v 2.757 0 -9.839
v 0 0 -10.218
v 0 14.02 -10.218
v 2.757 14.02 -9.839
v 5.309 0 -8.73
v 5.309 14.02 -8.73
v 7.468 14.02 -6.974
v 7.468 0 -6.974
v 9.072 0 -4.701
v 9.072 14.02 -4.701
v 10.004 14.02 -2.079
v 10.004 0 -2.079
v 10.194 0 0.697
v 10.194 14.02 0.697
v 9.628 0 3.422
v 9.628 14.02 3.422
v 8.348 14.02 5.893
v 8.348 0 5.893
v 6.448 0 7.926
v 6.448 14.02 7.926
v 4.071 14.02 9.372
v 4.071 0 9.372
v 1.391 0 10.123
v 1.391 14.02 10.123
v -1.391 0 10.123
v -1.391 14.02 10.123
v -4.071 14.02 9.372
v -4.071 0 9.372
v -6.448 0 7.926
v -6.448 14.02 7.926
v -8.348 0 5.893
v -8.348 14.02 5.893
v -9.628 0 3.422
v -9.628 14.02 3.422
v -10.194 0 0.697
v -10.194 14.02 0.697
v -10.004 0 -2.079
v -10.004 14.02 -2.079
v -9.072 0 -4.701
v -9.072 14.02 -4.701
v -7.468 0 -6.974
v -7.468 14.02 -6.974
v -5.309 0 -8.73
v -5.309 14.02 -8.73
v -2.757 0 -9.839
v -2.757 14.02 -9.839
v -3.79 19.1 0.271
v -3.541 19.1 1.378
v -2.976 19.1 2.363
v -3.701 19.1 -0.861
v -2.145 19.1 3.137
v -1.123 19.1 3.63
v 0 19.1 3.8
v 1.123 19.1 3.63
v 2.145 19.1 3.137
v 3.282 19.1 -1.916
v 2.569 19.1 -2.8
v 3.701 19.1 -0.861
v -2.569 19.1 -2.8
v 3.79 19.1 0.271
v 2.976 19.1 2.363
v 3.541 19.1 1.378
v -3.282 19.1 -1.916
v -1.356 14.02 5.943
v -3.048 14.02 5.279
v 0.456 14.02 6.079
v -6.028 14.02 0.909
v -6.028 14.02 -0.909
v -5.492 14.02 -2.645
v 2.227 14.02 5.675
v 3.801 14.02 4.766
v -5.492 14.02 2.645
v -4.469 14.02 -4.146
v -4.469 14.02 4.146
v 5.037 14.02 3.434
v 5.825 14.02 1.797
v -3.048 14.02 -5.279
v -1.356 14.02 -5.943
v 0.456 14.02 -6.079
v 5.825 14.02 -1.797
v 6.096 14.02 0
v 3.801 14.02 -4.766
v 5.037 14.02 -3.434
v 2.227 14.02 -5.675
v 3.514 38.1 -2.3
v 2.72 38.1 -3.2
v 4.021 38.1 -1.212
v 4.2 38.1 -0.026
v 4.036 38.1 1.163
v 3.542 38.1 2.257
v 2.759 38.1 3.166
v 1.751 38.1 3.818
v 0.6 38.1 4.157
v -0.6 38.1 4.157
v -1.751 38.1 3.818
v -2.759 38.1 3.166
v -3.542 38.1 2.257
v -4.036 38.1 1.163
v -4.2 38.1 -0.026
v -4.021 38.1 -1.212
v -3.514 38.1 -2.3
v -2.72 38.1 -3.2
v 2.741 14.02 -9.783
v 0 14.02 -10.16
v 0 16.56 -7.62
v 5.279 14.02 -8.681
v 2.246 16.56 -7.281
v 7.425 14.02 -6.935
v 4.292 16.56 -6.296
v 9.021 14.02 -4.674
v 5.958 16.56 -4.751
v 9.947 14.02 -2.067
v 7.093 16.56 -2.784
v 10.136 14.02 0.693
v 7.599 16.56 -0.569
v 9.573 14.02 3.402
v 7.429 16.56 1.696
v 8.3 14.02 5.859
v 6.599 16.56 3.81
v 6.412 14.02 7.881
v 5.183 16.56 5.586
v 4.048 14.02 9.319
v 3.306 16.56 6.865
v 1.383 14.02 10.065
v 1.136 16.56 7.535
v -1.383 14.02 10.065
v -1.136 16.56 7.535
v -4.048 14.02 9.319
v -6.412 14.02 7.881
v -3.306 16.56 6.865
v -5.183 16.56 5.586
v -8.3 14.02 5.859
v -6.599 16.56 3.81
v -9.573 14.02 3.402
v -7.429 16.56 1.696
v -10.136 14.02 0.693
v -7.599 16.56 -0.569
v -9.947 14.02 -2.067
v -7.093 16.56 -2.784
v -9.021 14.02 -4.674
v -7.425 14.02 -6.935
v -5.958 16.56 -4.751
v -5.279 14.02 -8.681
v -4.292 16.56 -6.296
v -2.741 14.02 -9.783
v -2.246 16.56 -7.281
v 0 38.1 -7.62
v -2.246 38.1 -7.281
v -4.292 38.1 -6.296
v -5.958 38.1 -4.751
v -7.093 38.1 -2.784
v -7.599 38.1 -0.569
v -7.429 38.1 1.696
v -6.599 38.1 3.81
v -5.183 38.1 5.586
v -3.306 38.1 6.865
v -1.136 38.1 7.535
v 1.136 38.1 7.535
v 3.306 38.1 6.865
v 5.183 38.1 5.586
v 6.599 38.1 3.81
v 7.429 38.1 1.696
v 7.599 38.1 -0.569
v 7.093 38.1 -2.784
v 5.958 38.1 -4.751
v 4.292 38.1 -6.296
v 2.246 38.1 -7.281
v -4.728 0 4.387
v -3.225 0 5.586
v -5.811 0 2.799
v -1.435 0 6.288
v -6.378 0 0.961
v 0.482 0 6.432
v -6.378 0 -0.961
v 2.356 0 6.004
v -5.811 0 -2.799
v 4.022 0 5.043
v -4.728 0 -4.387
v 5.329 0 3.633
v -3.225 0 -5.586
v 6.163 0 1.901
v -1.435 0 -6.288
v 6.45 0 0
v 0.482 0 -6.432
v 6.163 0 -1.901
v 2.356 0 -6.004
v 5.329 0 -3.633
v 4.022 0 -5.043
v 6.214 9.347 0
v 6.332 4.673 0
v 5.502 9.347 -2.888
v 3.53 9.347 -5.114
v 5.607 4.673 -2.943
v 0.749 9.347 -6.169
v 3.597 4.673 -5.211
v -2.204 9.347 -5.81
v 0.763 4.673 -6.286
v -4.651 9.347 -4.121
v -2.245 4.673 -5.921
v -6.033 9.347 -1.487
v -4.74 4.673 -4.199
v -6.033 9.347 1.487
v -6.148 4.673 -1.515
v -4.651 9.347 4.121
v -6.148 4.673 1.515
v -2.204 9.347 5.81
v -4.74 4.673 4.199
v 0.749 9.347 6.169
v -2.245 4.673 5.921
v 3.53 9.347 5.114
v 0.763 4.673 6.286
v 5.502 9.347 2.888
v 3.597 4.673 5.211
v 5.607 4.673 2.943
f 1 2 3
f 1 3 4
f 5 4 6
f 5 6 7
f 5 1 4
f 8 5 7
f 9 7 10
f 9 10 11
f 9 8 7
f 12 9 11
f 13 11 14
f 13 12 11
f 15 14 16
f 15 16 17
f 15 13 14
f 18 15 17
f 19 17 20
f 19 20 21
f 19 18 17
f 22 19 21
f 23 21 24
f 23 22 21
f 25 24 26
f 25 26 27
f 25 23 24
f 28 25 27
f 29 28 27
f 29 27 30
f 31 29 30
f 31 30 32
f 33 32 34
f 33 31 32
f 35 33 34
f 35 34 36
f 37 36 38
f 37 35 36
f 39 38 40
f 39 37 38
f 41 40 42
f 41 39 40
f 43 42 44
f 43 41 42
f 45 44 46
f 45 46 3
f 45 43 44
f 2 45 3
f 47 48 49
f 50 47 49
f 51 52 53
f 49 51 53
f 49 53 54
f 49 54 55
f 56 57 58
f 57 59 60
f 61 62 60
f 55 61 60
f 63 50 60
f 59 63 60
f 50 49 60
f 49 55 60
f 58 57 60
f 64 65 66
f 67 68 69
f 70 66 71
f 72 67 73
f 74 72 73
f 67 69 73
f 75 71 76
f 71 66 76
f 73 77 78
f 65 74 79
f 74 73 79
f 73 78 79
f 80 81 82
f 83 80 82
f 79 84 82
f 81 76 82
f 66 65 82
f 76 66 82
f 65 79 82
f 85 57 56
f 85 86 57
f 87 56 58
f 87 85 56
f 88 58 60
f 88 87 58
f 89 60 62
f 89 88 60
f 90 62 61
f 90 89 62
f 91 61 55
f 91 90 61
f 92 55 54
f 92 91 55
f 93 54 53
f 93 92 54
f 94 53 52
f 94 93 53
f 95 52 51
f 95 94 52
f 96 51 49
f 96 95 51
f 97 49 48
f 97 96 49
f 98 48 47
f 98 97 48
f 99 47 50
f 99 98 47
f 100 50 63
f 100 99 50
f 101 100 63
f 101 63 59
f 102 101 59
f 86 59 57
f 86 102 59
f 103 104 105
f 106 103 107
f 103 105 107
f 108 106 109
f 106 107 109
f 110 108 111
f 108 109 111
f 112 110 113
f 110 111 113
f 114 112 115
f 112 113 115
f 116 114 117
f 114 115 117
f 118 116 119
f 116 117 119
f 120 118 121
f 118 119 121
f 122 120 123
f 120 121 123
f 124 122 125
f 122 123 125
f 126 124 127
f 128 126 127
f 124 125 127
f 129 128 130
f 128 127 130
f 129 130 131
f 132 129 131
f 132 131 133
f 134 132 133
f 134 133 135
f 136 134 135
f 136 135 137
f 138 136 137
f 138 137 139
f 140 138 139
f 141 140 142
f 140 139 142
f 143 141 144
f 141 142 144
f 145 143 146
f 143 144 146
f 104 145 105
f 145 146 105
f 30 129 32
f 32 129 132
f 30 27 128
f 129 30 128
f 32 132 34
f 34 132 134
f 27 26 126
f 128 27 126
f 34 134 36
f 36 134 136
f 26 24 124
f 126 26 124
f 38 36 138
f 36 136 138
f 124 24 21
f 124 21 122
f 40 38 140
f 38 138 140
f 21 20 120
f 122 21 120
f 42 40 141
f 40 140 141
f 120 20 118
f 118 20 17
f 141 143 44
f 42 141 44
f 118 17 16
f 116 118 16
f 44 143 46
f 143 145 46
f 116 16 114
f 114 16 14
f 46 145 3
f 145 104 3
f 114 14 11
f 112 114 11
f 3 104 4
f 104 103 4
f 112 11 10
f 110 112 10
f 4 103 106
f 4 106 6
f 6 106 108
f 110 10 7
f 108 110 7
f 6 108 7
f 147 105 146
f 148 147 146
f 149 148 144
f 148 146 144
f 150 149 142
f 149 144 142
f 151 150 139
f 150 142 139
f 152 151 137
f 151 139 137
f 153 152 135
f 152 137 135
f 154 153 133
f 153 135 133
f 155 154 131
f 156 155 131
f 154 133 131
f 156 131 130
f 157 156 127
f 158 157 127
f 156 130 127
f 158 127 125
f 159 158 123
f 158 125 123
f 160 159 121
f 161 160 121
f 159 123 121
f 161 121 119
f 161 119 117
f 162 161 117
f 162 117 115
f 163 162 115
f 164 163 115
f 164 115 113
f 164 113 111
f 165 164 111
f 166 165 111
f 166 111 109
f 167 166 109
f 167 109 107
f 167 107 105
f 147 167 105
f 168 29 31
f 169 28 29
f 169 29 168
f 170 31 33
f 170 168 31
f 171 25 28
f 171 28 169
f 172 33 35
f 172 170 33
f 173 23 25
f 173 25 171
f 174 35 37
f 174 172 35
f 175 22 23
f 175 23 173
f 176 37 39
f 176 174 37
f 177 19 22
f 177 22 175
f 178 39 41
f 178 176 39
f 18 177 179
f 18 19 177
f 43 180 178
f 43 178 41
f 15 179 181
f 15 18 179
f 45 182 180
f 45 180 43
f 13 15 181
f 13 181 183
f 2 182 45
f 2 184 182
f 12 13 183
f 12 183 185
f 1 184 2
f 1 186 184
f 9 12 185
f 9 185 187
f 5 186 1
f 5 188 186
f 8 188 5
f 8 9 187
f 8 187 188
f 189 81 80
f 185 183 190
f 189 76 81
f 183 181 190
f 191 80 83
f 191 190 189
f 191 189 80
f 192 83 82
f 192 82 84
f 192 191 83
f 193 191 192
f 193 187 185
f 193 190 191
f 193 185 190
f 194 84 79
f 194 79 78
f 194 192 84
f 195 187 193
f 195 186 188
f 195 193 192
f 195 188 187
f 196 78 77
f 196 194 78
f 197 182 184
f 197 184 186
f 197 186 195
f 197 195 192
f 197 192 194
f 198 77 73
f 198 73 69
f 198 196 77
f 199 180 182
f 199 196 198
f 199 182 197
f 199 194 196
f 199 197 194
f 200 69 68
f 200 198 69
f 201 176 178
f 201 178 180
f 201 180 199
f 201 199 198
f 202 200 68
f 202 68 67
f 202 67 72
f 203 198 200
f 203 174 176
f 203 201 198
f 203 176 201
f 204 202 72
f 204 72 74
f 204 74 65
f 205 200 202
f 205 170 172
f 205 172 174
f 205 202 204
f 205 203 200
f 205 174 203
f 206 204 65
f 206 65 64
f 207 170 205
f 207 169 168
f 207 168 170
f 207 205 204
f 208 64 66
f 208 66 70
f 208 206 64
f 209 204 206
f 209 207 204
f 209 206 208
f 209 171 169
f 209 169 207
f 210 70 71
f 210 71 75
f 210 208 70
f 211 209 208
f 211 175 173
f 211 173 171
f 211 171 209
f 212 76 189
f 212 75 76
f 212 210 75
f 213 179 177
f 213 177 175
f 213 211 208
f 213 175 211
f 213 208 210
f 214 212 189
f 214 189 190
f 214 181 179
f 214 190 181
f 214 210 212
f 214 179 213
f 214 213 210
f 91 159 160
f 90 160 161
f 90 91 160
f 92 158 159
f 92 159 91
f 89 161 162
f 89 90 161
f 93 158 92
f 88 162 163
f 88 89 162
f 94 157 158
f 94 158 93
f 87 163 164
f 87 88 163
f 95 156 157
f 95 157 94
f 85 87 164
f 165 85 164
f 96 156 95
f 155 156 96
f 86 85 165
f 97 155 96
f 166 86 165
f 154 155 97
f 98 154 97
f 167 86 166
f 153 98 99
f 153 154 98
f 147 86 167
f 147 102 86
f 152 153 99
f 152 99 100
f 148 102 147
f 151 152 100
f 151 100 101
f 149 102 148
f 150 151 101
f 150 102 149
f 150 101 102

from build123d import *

# Parameters (mm, degrees)
SKETCH1_R           = 7.62
BOSS_EXTRUDE1_DEPTH = 38.1
SKETCH5_R           = 6.096
SKETCH3_R           = 6.450000054
SKETCH6_R           = 10.218046867
SKETCH6_R_2         = 7.62
BOSS_EXTRUDE2_DEPTH = 14.0199999
CHAMFER1_SIZE       = 2.54


with BuildPart() as part:
    # Sketch1 → Boss-Extrude1 (new body)
    with BuildSketch(Plane(origin=(0, 0, 0), x_dir=(1, 0, 0), z_dir=(0, 1, 0))):
        with Locations(Location((0, 0, 0), (0, 0, 90))):
            Circle(SKETCH1_R)
    extrude(amount=BOSS_EXTRUDE1_DEPTH)

    # Sketch4 → Motor Shaft Couple section 0
    with BuildSketch(Plane(origin=(0, 19.0999999, 0), x_dir=(1, 0, 0), z_dir=(0, 1, 0))):
        with BuildLine():
            Line((-2.569046516, 2.8), (2.569046516, 2.8))
            ThreePointArc((2.569046516, 2.8), (0, -3.8), (-2.569046516, 2.8))
        make_face()
    # Sketch2 → Motor Shaft Couple section 1
    with BuildSketch(Plane(origin=(0, 38.1, 0), x_dir=(1, 0, 0), z_dir=(0, 1, 0))):
        with BuildLine():
            Line((-2.720293955, 3.1999996), (2.720293955, 3.1999996))
            ThreePointArc((2.720293955, 3.1999996), (0, -4.1999996), (-2.720293955, 3.1999996))
        make_face()
    loft(mode=Mode.SUBTRACT)

    # Sketch5 → Dowel Couple section 0
    with BuildSketch(Plane(origin=(0, 14.0199999, 0), x_dir=(1, 0, 0), z_dir=(0, 1, 0))):
        Circle(SKETCH5_R)
    # Sketch3 → Dowel Couple section 1
    with BuildSketch(Plane.XZ):
        Circle(SKETCH3_R)
    loft(mode=Mode.SUBTRACT)

    # Sketch6 → Boss-Extrude2 (add)
    with BuildSketch(Plane.XZ):
        with Locations(Location((0, 0, 0), (0, 0, 270))):
            Circle(SKETCH6_R)
        with Locations(Location((0, 0, 0), (0, 0, 270))):
            Circle(SKETCH6_R_2, mode=Mode.SUBTRACT)
    extrude(amount=-BOSS_EXTRUDE2_DEPTH)

    # Chamfer1
    chamfer1_edges = [part.edges().sort_by_distance(p)[0] for p in [
        (0, 14.0199999, 7.62),
    ]]
    chamfer(chamfer1_edges, length=CHAMFER1_SIZE)


solid = part.part
